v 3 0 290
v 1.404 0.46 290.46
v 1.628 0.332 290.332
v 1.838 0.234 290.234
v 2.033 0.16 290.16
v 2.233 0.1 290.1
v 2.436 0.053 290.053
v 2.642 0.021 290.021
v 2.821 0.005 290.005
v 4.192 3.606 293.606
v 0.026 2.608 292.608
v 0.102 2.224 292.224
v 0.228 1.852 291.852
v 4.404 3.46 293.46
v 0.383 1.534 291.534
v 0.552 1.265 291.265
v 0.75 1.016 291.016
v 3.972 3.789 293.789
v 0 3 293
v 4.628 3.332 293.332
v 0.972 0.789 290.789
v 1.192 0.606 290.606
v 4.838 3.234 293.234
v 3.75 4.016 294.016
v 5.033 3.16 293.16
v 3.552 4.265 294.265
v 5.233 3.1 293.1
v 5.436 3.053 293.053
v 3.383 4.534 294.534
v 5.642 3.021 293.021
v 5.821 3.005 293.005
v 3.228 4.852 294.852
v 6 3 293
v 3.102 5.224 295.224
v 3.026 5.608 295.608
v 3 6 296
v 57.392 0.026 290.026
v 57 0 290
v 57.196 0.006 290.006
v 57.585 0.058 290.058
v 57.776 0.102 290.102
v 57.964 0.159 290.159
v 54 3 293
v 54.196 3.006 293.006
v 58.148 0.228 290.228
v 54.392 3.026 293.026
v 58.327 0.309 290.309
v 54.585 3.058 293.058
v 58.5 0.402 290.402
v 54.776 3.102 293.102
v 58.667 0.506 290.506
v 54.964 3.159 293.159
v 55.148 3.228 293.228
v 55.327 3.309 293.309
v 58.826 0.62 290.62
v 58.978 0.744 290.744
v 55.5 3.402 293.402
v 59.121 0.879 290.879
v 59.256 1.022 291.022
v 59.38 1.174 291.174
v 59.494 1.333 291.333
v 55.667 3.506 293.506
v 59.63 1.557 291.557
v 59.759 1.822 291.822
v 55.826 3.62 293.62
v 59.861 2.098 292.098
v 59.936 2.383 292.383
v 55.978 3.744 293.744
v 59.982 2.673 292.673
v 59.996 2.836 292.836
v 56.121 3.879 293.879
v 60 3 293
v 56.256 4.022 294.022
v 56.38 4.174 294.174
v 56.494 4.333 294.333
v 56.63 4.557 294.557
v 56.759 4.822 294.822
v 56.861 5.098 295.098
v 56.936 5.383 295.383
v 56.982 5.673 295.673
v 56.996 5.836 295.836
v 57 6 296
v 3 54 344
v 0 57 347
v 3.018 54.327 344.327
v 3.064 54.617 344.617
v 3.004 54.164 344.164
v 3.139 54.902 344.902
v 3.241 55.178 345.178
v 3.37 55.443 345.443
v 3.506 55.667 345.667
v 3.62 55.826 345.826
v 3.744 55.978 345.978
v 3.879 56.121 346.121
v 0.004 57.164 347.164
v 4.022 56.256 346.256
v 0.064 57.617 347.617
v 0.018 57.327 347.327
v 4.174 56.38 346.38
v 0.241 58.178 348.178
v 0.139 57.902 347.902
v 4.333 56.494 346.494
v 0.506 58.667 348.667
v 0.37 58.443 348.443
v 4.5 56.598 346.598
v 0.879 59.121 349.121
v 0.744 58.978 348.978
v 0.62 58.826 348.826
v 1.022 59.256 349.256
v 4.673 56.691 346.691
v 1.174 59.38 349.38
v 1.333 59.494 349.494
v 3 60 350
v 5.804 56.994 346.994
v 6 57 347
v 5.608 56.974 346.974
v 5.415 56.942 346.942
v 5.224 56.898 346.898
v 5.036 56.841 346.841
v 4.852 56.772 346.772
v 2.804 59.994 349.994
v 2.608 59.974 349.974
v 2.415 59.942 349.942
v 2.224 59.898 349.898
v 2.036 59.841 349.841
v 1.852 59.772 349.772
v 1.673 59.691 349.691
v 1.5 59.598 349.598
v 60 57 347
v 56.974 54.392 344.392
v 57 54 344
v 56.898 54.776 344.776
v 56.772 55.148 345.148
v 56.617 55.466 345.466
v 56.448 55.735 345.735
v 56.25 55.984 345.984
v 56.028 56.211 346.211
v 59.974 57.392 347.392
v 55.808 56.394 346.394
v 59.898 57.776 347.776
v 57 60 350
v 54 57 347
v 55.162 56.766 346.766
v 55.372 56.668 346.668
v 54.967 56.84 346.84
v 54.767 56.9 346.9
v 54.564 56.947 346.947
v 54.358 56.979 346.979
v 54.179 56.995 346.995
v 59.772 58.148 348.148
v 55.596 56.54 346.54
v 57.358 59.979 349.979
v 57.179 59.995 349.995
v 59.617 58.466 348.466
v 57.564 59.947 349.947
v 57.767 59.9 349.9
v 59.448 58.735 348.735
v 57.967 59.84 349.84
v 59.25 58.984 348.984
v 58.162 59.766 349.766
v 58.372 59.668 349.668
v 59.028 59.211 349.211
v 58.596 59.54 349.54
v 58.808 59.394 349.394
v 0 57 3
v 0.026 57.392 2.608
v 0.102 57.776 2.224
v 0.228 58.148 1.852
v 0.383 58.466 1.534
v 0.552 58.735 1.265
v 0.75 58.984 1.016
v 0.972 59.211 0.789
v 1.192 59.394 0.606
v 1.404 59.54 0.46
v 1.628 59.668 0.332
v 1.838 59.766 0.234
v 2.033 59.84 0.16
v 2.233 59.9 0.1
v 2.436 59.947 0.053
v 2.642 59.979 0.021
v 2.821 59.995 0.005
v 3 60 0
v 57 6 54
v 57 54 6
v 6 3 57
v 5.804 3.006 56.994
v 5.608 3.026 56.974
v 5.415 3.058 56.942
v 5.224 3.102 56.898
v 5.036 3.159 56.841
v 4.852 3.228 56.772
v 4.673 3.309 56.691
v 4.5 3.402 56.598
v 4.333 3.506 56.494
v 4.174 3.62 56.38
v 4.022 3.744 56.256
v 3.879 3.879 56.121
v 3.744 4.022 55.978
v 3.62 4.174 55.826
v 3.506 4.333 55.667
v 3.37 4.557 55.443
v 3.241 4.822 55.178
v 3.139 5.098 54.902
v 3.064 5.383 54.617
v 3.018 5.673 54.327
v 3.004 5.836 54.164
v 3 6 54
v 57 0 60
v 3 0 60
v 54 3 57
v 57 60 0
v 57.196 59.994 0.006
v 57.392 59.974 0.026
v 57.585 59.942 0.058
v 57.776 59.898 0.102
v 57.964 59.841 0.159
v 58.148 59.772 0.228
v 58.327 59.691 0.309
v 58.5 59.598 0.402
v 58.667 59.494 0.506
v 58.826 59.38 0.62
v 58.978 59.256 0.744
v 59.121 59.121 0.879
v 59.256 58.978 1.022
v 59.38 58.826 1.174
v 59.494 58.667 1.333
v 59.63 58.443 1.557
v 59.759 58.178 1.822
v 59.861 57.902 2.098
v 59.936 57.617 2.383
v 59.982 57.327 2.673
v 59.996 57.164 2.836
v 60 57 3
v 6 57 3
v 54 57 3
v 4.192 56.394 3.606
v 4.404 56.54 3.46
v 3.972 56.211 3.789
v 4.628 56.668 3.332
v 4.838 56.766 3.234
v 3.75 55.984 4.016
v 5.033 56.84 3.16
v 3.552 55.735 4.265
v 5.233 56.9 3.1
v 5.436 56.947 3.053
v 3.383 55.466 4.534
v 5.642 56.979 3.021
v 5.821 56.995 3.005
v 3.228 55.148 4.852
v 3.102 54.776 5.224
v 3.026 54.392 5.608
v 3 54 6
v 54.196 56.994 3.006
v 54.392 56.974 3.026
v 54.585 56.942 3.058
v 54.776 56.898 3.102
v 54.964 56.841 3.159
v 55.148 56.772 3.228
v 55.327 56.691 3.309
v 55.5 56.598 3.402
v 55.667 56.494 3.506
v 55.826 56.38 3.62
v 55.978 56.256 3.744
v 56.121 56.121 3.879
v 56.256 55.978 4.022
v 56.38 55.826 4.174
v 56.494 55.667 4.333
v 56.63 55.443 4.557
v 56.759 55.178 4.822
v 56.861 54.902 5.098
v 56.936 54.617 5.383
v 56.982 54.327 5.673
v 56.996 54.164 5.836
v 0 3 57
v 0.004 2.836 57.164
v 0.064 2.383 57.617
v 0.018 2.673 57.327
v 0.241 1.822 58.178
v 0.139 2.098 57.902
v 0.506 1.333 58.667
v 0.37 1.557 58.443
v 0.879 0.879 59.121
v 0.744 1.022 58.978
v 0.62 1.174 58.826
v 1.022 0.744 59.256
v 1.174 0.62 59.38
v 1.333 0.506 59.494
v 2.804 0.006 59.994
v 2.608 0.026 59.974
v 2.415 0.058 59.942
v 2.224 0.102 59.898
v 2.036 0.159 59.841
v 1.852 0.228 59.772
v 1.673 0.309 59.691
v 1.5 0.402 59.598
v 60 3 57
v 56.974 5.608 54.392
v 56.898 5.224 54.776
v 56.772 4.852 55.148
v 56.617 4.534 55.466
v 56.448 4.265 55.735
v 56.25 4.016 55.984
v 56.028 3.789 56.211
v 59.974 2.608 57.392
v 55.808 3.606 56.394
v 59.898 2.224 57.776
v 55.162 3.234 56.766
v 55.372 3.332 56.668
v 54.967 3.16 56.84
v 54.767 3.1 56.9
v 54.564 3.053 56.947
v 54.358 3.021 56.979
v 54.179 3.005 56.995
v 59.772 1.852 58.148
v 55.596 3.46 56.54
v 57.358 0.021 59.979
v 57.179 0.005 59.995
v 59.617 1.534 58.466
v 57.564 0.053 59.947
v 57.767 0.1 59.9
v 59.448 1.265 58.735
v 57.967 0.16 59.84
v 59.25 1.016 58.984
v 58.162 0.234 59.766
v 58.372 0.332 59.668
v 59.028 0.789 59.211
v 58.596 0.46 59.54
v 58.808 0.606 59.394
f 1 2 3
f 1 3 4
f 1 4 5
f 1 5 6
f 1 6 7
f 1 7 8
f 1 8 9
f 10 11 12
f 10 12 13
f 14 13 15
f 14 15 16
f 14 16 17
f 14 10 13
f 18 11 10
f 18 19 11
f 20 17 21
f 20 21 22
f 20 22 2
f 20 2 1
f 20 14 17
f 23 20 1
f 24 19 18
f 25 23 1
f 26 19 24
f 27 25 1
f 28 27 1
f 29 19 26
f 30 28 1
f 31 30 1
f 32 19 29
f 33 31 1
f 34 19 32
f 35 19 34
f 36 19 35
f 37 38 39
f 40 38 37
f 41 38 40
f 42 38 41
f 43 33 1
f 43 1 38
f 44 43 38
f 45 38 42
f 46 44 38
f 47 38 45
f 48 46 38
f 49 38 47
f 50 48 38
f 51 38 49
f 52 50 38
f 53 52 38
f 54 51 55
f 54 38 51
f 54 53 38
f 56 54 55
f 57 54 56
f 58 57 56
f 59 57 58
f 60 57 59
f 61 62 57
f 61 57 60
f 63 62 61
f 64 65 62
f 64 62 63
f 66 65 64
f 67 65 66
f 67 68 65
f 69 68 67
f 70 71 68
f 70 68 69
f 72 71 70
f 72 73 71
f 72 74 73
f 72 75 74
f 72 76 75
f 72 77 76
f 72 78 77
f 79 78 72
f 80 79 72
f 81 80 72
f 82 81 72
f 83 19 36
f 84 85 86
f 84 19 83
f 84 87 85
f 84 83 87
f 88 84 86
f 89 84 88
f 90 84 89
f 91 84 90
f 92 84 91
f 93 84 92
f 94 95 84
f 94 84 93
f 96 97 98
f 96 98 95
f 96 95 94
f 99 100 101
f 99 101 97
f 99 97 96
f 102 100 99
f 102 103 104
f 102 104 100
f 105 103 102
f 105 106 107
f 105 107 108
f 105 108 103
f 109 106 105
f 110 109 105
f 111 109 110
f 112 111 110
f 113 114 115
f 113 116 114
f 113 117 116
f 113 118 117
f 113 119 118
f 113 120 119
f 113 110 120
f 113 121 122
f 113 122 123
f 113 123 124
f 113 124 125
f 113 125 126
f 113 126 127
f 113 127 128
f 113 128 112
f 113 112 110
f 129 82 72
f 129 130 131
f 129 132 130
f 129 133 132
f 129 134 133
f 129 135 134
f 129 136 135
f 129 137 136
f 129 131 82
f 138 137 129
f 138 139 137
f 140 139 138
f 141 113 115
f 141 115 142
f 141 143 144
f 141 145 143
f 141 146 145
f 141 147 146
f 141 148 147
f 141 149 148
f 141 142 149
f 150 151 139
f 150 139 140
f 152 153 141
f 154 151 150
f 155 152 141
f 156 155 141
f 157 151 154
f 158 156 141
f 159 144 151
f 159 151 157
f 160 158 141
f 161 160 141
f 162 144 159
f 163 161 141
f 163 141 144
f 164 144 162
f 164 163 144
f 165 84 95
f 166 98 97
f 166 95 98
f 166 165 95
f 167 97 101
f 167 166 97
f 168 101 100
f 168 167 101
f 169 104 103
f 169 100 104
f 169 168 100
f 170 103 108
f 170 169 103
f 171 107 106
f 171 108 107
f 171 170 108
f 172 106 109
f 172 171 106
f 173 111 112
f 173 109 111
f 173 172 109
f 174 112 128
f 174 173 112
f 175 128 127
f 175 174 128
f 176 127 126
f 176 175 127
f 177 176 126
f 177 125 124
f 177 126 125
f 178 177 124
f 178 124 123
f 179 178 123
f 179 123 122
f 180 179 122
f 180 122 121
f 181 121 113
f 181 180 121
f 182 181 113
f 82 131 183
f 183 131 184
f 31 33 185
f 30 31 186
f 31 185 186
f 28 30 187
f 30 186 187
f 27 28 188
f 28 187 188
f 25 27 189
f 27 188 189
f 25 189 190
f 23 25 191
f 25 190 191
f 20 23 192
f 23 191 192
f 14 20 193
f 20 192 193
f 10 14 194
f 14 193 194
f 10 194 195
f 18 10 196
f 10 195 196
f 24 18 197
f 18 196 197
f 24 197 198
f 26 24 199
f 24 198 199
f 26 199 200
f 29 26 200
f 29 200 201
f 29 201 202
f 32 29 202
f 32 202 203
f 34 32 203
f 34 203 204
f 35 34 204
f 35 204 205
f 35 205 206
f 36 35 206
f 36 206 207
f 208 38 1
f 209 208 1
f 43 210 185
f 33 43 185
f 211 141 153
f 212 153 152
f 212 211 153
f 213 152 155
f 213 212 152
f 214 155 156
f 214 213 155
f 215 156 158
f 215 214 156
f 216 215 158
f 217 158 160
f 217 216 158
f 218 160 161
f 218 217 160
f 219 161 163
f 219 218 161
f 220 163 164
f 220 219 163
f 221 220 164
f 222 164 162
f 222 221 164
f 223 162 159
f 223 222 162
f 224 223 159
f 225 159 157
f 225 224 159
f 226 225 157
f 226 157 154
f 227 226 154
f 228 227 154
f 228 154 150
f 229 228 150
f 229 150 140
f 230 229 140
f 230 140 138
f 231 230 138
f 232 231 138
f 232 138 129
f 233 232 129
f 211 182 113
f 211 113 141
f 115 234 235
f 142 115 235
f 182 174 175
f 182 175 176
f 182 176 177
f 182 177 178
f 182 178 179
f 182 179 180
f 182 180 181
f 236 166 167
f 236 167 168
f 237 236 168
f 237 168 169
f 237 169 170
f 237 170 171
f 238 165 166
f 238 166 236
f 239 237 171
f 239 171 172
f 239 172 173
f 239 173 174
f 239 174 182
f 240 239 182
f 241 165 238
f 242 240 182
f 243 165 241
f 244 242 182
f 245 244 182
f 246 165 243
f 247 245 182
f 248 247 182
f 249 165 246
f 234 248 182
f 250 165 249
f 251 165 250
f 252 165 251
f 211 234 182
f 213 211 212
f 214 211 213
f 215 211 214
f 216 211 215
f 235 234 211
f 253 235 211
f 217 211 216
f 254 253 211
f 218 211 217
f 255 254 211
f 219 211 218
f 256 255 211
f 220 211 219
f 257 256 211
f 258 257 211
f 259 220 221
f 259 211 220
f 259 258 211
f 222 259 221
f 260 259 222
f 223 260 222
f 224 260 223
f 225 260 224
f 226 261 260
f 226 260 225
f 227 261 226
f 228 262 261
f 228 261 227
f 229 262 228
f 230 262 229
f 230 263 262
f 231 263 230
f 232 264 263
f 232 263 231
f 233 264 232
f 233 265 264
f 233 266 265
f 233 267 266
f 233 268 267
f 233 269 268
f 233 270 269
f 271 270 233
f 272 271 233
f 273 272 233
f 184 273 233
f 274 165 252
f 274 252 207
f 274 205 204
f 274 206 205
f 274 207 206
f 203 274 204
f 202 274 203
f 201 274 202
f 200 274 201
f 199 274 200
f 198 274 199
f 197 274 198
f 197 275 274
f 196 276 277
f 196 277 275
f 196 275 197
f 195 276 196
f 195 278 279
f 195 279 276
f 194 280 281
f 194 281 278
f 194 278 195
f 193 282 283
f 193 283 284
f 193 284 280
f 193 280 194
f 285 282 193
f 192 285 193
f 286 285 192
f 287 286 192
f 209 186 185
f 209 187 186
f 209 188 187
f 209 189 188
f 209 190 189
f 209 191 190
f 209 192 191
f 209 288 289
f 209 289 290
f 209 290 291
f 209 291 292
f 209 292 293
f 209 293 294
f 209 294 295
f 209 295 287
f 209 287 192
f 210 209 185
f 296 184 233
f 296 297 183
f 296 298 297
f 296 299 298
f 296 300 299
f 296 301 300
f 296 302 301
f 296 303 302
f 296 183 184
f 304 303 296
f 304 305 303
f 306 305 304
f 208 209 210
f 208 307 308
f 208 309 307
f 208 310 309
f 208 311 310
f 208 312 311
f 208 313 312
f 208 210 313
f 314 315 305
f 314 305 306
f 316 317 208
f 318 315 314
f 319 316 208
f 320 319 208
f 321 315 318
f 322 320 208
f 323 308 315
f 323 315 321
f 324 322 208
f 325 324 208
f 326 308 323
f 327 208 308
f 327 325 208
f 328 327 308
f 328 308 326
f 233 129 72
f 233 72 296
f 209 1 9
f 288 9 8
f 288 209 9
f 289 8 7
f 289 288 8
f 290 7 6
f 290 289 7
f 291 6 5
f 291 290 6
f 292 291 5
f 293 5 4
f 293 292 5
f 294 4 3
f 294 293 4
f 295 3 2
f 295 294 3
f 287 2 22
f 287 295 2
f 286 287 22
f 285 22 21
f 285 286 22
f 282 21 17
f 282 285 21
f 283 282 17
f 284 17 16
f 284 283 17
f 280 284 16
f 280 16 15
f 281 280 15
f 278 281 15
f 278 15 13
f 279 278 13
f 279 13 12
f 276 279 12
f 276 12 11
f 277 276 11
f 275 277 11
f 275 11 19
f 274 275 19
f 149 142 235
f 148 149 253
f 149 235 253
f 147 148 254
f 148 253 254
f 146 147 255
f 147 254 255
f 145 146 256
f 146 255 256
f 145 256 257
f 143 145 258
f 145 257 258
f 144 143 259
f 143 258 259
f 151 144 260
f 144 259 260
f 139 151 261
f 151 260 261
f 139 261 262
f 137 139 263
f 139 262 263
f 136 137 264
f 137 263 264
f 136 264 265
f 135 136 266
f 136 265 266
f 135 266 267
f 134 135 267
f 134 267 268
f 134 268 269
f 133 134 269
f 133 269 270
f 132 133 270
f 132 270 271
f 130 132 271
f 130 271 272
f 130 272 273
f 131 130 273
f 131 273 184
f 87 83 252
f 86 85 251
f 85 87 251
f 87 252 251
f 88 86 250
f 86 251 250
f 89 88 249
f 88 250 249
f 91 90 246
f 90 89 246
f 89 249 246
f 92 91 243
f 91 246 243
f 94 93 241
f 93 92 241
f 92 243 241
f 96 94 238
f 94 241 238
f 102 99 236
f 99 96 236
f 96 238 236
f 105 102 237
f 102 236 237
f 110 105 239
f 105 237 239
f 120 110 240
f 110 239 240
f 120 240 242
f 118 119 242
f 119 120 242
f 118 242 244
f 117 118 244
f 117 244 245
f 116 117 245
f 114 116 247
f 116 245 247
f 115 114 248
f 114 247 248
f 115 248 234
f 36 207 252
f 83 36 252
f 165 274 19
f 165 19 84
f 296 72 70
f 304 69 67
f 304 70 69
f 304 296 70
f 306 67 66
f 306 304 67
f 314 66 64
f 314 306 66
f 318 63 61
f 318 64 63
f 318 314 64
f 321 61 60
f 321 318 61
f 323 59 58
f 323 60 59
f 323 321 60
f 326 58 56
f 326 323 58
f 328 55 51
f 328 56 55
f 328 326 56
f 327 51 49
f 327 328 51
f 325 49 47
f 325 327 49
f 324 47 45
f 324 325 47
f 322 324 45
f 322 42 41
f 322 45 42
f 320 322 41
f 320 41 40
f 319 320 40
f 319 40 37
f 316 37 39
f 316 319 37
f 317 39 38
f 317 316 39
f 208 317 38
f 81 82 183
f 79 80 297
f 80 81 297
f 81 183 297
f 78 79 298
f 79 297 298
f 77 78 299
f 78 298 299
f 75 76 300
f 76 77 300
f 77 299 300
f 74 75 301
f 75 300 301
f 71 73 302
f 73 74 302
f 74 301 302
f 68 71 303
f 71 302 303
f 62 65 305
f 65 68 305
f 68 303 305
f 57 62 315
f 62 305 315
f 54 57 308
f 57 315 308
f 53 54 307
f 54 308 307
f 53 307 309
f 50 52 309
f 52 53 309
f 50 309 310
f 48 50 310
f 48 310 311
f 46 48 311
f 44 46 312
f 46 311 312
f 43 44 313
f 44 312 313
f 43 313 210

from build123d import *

# Parameters (mm, degrees)
DODANIE_WYCI_GNI_CIE1_DEPTH = 350
SZKIC2_W                    = 140.103855023
SZKIC2_H                    = 128.958798703
WYTNIJ_WYCI_GNI_CIE1_DEPTH  = 297.057426862
SZKIC3_W                    = 180.28107172
SZKIC3_H                    = 138.969006622
WYTNIJ_WYCI_GNI_CIE2_DEPTH  = 327.955654485


with BuildPart() as part:
    # Szkic1 → Dodanie-wyciągnięcie1 (new body)
    with BuildSketch(Plane.XY):
        with BuildLine():
            ThreePointArc((0, 57), (0.878679656, 59.121320344), (3, 60))
            Line((3, 60), (57, 60))
            ThreePointArc((57, 60), (59.121320344, 59.121320344), (60, 57))
            Line((60, 57), (60, 3))
            ThreePointArc((60, 3), (59.121320344, 0.878679656), (57, 0))
            Line((57, 0), (3, 0))
            ThreePointArc((3, 0), (0.878679656, 0.878679656), (0, 3))
            Line((0, 3), (0, 57))
        make_face()
        with BuildLine():
            Line((3, 6), (3, 54))
            ThreePointArc((3, 54), (3.878679656, 56.121320344), (6, 57))
            Line((6, 57), (54, 57))
            ThreePointArc((54, 57), (56.121320344, 56.121320344), (57, 54))
            Line((57, 54), (57, 6))
            ThreePointArc((57, 6), (56.121320344, 3.878679656), (54, 3))
            Line((54, 3), (6, 3))
            ThreePointArc((6, 3), (3.878679656, 3.878679656), (3, 6))
        make_face(mode=Mode.SUBTRACT)
    extrude(amount=DODANIE_WYCI_GNI_CIE1_DEPTH)

    # Szkic2 → Wytnij-wyciągnięcie1 (cut, through all)
    with BuildSketch(Plane(origin=(0, -145, 145), x_dir=(1, 0, 0), z_dir=(0, -0.7071067811865488, 0.7071067811865464))):
        with Locations((39.65073467, 253.465731554)):
            Rectangle(SZKIC2_W, SZKIC2_H)
    extrude(amount=WYTNIJ_WYCI_GNI_CIE1_DEPTH, mode=Mode.SUBTRACT)

    # Szkic3 → Wytnij-wyciągnięcie2 (cut, through all)
    with BuildSketch(Plane(origin=(0, 30, 30), x_dir=(1, 0, 0), z_dir=(0, -0.7071067811865488, -0.7071067811865464))):
        with Locations((27.094402169, -5.623479723)):
            Rectangle(SZKIC3_W, SZKIC3_H)
    extrude(amount=WYTNIJ_WYCI_GNI_CIE2_DEPTH, mode=Mode.SUBTRACT)


solid = part.part
